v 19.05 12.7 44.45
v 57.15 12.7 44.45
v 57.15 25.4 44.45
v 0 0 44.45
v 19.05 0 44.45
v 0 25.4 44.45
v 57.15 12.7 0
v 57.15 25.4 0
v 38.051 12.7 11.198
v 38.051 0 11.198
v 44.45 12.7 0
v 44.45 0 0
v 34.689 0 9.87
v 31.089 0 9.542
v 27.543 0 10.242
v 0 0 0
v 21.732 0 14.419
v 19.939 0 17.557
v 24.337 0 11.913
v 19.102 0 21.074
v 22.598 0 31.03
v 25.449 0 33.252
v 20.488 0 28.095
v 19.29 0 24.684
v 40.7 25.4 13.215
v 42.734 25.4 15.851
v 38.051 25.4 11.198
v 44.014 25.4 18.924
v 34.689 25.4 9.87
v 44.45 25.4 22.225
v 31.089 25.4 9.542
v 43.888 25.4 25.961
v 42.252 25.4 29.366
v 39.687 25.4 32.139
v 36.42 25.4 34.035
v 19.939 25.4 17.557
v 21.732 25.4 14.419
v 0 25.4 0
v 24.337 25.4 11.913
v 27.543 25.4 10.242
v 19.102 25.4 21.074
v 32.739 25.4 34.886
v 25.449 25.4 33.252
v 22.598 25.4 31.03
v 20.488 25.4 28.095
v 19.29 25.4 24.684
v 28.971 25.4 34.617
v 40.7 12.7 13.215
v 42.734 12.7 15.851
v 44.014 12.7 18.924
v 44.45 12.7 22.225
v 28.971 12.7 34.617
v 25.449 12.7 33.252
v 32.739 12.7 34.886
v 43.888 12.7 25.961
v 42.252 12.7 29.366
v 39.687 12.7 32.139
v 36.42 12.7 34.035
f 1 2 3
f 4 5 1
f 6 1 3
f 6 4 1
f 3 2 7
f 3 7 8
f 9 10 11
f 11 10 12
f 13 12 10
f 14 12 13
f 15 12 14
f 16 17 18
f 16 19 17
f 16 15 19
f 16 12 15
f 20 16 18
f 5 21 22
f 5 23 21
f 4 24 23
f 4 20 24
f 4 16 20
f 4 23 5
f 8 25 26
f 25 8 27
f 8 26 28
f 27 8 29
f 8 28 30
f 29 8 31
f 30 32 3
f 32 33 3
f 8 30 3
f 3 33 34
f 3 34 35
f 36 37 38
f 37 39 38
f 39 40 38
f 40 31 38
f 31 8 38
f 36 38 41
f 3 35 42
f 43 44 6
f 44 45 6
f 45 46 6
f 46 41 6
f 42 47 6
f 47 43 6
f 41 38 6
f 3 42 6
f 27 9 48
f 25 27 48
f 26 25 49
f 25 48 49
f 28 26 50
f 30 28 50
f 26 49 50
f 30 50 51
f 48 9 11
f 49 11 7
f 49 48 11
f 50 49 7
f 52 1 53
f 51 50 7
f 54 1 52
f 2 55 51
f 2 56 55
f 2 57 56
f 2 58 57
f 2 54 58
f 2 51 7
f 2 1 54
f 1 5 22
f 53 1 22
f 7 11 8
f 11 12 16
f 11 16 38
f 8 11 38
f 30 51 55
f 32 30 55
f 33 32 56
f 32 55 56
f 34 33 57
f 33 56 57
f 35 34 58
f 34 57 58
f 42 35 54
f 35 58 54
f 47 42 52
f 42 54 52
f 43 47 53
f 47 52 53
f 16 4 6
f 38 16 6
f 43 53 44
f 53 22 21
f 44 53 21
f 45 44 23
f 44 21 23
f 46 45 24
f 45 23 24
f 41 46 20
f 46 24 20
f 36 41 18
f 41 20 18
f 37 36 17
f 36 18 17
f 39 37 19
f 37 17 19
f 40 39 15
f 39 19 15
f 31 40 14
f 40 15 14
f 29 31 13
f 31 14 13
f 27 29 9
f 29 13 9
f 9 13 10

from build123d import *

# Parameters (mm, degrees)
F0_W     = 25.4
F0_H     = 44.45
F1_DEPTH = 57.15
F3_DEPTH = 12.7
F5_DEPTH = 25.4


with BuildPart() as f1:
    # F0 (on Right) → F1 (new body)
    with BuildSketch(Plane.YZ):
        with Locations((12.7, 22.225)):
            Rectangle(F0_W, F0_H)
    extrude(amount=F1_DEPTH)

    # F2 (on face) → F3 (cut)
    with BuildSketch(Plane.XZ):
        Polygon((57.15, 44.45), (19.05, 44.45), (44.45, 0), (57.15, 0), align=None)
    extrude(amount=-F3_DEPTH, mode=Mode.SUBTRACT)

    # F4 (on face) → F5 (cut)
    with BuildSketch(Plane.XZ):
        with BuildLine():
            ThreePointArc((38.050965, 11.198312), (42.734358, 15.850529), (44.45, 22.225))
            ThreePointArc((44.45, 22.225), (38.124471, 33.209358), (25.449035, 33.251688))
            Line((25.449035, 33.251688), (38.050965, 11.198312))
        make_face()
        with BuildLine():
            Line((38.050965, 11.198312), (25.449035, 33.251688))
            ThreePointArc((25.449035, 33.251688), (20.723312, 15.924035), (38.050965, 11.198312))
        make_face()
    extrude(amount=-F5_DEPTH, mode=Mode.SUBTRACT)


solid = f1.part
